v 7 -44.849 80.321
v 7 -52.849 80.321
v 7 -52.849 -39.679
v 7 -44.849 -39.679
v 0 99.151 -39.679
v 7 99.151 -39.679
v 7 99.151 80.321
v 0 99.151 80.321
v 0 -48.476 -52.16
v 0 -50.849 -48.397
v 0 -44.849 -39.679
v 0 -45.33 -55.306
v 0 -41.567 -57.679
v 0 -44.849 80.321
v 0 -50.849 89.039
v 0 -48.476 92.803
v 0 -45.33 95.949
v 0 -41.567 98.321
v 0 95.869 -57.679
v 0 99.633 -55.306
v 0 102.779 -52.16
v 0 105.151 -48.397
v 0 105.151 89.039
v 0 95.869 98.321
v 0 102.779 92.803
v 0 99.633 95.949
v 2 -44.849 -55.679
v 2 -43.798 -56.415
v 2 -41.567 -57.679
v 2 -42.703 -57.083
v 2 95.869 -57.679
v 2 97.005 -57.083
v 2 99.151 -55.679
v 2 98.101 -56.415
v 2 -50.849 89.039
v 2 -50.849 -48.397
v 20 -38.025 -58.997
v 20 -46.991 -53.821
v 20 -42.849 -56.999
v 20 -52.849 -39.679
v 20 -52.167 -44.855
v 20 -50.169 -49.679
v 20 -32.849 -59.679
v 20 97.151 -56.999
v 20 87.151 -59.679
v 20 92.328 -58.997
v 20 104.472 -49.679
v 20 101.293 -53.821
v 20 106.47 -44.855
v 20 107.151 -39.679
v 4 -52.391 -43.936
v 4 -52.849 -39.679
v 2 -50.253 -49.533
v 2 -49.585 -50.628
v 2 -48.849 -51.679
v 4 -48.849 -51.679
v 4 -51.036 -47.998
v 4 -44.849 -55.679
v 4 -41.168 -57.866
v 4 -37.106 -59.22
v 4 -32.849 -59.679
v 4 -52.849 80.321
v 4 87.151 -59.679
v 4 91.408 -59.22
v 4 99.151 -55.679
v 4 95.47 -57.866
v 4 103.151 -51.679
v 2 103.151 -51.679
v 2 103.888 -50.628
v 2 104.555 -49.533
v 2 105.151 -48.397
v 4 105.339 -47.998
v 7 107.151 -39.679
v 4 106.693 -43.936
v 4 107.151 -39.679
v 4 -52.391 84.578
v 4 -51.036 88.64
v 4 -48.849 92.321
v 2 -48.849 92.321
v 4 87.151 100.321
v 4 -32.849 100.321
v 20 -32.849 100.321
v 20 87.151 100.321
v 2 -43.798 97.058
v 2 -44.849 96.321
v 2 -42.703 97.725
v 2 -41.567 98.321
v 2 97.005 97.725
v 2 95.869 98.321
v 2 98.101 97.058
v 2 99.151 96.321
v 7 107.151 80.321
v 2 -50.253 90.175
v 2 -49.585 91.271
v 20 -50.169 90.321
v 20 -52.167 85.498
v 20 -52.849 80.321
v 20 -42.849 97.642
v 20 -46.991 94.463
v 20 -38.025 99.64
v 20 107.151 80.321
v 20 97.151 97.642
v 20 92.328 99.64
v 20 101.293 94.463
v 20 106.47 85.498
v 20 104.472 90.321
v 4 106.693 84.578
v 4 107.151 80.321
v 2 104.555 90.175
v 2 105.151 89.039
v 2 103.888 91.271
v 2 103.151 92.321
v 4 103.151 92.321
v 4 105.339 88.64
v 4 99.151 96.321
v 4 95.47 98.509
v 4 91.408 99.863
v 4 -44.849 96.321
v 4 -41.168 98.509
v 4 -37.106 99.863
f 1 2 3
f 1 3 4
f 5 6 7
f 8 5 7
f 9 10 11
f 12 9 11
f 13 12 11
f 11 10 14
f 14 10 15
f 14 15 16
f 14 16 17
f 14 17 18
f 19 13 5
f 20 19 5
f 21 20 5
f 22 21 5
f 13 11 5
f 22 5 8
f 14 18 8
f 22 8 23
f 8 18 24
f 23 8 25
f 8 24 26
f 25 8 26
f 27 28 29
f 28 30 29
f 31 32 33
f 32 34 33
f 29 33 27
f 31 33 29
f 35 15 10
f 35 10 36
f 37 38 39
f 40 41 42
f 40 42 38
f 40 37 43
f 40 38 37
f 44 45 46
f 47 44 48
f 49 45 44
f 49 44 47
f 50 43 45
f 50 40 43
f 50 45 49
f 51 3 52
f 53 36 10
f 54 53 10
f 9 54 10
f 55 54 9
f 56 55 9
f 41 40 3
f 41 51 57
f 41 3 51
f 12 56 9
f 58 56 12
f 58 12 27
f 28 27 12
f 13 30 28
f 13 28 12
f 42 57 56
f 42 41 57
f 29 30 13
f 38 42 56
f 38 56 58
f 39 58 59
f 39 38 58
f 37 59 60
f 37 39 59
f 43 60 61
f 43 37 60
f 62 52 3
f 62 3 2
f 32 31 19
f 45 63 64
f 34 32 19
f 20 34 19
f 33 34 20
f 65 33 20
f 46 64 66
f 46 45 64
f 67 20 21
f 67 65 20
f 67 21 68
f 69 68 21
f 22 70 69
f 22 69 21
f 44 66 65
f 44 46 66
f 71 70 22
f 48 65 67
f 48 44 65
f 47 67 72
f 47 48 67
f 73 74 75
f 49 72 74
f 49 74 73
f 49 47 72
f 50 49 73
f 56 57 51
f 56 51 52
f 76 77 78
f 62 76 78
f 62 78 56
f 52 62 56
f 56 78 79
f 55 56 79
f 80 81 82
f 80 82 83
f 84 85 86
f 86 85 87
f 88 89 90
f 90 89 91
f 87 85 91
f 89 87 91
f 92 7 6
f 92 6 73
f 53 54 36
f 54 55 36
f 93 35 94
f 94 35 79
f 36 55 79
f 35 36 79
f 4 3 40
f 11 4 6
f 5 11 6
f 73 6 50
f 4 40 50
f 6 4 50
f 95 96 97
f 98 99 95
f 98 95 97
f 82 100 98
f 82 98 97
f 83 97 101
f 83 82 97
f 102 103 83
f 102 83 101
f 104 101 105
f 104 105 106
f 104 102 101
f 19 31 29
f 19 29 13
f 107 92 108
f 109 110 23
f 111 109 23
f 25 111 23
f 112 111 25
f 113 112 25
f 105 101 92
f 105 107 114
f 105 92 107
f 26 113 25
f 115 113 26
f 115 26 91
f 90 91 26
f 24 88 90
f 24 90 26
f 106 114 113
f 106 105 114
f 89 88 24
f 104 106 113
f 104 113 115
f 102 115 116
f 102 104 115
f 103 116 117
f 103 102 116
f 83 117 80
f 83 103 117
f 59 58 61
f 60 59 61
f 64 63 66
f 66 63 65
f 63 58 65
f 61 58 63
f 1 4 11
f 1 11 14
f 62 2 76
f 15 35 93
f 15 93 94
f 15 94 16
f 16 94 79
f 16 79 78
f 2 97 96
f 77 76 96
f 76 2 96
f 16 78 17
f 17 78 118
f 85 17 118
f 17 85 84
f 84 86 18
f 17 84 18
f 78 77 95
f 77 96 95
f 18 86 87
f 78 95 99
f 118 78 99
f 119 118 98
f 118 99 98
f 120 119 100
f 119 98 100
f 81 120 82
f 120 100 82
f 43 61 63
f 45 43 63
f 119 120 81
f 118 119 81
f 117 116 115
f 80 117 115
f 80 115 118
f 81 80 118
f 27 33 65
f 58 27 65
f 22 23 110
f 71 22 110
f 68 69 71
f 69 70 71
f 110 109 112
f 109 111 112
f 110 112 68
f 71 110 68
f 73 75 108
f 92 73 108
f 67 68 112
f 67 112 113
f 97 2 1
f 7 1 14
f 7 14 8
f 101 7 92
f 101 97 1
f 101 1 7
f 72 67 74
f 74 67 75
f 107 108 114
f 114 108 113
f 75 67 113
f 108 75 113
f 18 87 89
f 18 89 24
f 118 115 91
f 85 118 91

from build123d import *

# Parameters (mm, degrees)
F0_W      = 160
F0_H      = 160
F1_DEPTH  = 20
F2_R      = 20
F3_W      = 144
F3_H      = 120
F4_DEPTH  = 60
F5_W      = 160
F5_H      = 120
F6_DEPTH  = 13
F7_W      = 2
F7_H      = 2
F8_DEPTH  = 153.4
F9_W      = 2
F9_H      = 2
F9_W_2    = 3.241547
F9_H_2    = 2.78797
F10_DEPTH = 165


with BuildPart() as f1:
    # F0 (on Right) → F1 (new body)
    with BuildSketch(Plane.YZ):
        with Locations((27.151147, 20.321211)):
            Rectangle(F0_W, F0_H)
    extrude(amount=F1_DEPTH)

    # F2
    f2_edges = [f1.edges().sort_by_distance(p)[0] for p in [
        (10, -52.848853, 100.321211),
        (10, 107.151147, 100.321211),
        (10, -52.848853, -59.678789),
        (10, 107.151147, -59.678789),
    ]]
    fillet(f2_edges, radius=F2_R)

    # F3 (on face) → F4 (cut)
    with BuildSketch(Plane.YZ.offset(20)):
        with Locations((27.151147, 20.321211)):
            Rectangle(F3_W, F3_H)
    extrude(amount=-F4_DEPTH, mode=Mode.SUBTRACT)

    # F5 (on face) → F6 (cut)
    with BuildSketch(Plane.YZ.offset(20)):
        with Locations((27.151147, 20.321211)):
            Rectangle(F5_W, F5_H)
    extrude(amount=-F6_DEPTH, mode=Mode.SUBTRACT)

    # F7 (on face) → F8 (cut)
    with BuildSketch(Plane.XY.offset(100.321211)):
        Polygon((2, -52.848853), (2, -57.705119), (4, -57.705119), (4, -48.848853), (2, -48.848853), (2, -50.848853), align=None)
        with Locations((1, -51.848853)):
            Rectangle(F7_W, F7_H)
        Polygon((2, 103.151147), (4, 103.151147), (4, 113.693945), (2, 113.693945), (2, 107.151147), (2, 105.151147), align=None)
        with Locations((1, 106.151147)):
            Rectangle(F7_W, F7_H)
    extrude(amount=-F8_DEPTH, mode=Mode.SUBTRACT)

    # F9 (on face) → F10 (cut)
    with BuildSketch(Plane(origin=(0, 107.151147, 0), x_dir=(-1, 0, 0), z_dir=(0, 1, 0))):
        Polygon((-4, 96.321211), (-2, 96.321211), (-2, 98.321211), (-2, 100.321211), (-2, 102.704816), (-4, 102.704816), align=None)
        with Locations((-1, 99.321211)):
            Rectangle(F9_W, F9_H)
        Polygon((-2, -57.678789), (-2, -55.678789), (-4, -55.678789), (-4, -64.467512), (-2, -64.467512), (-2, -60.466759), align=None)
        with Locations((-0.379227, -59.072774)):
            Rectangle(F9_W_2, F9_H_2)
    extrude(amount=-F10_DEPTH, mode=Mode.SUBTRACT)


solid = f1.part
